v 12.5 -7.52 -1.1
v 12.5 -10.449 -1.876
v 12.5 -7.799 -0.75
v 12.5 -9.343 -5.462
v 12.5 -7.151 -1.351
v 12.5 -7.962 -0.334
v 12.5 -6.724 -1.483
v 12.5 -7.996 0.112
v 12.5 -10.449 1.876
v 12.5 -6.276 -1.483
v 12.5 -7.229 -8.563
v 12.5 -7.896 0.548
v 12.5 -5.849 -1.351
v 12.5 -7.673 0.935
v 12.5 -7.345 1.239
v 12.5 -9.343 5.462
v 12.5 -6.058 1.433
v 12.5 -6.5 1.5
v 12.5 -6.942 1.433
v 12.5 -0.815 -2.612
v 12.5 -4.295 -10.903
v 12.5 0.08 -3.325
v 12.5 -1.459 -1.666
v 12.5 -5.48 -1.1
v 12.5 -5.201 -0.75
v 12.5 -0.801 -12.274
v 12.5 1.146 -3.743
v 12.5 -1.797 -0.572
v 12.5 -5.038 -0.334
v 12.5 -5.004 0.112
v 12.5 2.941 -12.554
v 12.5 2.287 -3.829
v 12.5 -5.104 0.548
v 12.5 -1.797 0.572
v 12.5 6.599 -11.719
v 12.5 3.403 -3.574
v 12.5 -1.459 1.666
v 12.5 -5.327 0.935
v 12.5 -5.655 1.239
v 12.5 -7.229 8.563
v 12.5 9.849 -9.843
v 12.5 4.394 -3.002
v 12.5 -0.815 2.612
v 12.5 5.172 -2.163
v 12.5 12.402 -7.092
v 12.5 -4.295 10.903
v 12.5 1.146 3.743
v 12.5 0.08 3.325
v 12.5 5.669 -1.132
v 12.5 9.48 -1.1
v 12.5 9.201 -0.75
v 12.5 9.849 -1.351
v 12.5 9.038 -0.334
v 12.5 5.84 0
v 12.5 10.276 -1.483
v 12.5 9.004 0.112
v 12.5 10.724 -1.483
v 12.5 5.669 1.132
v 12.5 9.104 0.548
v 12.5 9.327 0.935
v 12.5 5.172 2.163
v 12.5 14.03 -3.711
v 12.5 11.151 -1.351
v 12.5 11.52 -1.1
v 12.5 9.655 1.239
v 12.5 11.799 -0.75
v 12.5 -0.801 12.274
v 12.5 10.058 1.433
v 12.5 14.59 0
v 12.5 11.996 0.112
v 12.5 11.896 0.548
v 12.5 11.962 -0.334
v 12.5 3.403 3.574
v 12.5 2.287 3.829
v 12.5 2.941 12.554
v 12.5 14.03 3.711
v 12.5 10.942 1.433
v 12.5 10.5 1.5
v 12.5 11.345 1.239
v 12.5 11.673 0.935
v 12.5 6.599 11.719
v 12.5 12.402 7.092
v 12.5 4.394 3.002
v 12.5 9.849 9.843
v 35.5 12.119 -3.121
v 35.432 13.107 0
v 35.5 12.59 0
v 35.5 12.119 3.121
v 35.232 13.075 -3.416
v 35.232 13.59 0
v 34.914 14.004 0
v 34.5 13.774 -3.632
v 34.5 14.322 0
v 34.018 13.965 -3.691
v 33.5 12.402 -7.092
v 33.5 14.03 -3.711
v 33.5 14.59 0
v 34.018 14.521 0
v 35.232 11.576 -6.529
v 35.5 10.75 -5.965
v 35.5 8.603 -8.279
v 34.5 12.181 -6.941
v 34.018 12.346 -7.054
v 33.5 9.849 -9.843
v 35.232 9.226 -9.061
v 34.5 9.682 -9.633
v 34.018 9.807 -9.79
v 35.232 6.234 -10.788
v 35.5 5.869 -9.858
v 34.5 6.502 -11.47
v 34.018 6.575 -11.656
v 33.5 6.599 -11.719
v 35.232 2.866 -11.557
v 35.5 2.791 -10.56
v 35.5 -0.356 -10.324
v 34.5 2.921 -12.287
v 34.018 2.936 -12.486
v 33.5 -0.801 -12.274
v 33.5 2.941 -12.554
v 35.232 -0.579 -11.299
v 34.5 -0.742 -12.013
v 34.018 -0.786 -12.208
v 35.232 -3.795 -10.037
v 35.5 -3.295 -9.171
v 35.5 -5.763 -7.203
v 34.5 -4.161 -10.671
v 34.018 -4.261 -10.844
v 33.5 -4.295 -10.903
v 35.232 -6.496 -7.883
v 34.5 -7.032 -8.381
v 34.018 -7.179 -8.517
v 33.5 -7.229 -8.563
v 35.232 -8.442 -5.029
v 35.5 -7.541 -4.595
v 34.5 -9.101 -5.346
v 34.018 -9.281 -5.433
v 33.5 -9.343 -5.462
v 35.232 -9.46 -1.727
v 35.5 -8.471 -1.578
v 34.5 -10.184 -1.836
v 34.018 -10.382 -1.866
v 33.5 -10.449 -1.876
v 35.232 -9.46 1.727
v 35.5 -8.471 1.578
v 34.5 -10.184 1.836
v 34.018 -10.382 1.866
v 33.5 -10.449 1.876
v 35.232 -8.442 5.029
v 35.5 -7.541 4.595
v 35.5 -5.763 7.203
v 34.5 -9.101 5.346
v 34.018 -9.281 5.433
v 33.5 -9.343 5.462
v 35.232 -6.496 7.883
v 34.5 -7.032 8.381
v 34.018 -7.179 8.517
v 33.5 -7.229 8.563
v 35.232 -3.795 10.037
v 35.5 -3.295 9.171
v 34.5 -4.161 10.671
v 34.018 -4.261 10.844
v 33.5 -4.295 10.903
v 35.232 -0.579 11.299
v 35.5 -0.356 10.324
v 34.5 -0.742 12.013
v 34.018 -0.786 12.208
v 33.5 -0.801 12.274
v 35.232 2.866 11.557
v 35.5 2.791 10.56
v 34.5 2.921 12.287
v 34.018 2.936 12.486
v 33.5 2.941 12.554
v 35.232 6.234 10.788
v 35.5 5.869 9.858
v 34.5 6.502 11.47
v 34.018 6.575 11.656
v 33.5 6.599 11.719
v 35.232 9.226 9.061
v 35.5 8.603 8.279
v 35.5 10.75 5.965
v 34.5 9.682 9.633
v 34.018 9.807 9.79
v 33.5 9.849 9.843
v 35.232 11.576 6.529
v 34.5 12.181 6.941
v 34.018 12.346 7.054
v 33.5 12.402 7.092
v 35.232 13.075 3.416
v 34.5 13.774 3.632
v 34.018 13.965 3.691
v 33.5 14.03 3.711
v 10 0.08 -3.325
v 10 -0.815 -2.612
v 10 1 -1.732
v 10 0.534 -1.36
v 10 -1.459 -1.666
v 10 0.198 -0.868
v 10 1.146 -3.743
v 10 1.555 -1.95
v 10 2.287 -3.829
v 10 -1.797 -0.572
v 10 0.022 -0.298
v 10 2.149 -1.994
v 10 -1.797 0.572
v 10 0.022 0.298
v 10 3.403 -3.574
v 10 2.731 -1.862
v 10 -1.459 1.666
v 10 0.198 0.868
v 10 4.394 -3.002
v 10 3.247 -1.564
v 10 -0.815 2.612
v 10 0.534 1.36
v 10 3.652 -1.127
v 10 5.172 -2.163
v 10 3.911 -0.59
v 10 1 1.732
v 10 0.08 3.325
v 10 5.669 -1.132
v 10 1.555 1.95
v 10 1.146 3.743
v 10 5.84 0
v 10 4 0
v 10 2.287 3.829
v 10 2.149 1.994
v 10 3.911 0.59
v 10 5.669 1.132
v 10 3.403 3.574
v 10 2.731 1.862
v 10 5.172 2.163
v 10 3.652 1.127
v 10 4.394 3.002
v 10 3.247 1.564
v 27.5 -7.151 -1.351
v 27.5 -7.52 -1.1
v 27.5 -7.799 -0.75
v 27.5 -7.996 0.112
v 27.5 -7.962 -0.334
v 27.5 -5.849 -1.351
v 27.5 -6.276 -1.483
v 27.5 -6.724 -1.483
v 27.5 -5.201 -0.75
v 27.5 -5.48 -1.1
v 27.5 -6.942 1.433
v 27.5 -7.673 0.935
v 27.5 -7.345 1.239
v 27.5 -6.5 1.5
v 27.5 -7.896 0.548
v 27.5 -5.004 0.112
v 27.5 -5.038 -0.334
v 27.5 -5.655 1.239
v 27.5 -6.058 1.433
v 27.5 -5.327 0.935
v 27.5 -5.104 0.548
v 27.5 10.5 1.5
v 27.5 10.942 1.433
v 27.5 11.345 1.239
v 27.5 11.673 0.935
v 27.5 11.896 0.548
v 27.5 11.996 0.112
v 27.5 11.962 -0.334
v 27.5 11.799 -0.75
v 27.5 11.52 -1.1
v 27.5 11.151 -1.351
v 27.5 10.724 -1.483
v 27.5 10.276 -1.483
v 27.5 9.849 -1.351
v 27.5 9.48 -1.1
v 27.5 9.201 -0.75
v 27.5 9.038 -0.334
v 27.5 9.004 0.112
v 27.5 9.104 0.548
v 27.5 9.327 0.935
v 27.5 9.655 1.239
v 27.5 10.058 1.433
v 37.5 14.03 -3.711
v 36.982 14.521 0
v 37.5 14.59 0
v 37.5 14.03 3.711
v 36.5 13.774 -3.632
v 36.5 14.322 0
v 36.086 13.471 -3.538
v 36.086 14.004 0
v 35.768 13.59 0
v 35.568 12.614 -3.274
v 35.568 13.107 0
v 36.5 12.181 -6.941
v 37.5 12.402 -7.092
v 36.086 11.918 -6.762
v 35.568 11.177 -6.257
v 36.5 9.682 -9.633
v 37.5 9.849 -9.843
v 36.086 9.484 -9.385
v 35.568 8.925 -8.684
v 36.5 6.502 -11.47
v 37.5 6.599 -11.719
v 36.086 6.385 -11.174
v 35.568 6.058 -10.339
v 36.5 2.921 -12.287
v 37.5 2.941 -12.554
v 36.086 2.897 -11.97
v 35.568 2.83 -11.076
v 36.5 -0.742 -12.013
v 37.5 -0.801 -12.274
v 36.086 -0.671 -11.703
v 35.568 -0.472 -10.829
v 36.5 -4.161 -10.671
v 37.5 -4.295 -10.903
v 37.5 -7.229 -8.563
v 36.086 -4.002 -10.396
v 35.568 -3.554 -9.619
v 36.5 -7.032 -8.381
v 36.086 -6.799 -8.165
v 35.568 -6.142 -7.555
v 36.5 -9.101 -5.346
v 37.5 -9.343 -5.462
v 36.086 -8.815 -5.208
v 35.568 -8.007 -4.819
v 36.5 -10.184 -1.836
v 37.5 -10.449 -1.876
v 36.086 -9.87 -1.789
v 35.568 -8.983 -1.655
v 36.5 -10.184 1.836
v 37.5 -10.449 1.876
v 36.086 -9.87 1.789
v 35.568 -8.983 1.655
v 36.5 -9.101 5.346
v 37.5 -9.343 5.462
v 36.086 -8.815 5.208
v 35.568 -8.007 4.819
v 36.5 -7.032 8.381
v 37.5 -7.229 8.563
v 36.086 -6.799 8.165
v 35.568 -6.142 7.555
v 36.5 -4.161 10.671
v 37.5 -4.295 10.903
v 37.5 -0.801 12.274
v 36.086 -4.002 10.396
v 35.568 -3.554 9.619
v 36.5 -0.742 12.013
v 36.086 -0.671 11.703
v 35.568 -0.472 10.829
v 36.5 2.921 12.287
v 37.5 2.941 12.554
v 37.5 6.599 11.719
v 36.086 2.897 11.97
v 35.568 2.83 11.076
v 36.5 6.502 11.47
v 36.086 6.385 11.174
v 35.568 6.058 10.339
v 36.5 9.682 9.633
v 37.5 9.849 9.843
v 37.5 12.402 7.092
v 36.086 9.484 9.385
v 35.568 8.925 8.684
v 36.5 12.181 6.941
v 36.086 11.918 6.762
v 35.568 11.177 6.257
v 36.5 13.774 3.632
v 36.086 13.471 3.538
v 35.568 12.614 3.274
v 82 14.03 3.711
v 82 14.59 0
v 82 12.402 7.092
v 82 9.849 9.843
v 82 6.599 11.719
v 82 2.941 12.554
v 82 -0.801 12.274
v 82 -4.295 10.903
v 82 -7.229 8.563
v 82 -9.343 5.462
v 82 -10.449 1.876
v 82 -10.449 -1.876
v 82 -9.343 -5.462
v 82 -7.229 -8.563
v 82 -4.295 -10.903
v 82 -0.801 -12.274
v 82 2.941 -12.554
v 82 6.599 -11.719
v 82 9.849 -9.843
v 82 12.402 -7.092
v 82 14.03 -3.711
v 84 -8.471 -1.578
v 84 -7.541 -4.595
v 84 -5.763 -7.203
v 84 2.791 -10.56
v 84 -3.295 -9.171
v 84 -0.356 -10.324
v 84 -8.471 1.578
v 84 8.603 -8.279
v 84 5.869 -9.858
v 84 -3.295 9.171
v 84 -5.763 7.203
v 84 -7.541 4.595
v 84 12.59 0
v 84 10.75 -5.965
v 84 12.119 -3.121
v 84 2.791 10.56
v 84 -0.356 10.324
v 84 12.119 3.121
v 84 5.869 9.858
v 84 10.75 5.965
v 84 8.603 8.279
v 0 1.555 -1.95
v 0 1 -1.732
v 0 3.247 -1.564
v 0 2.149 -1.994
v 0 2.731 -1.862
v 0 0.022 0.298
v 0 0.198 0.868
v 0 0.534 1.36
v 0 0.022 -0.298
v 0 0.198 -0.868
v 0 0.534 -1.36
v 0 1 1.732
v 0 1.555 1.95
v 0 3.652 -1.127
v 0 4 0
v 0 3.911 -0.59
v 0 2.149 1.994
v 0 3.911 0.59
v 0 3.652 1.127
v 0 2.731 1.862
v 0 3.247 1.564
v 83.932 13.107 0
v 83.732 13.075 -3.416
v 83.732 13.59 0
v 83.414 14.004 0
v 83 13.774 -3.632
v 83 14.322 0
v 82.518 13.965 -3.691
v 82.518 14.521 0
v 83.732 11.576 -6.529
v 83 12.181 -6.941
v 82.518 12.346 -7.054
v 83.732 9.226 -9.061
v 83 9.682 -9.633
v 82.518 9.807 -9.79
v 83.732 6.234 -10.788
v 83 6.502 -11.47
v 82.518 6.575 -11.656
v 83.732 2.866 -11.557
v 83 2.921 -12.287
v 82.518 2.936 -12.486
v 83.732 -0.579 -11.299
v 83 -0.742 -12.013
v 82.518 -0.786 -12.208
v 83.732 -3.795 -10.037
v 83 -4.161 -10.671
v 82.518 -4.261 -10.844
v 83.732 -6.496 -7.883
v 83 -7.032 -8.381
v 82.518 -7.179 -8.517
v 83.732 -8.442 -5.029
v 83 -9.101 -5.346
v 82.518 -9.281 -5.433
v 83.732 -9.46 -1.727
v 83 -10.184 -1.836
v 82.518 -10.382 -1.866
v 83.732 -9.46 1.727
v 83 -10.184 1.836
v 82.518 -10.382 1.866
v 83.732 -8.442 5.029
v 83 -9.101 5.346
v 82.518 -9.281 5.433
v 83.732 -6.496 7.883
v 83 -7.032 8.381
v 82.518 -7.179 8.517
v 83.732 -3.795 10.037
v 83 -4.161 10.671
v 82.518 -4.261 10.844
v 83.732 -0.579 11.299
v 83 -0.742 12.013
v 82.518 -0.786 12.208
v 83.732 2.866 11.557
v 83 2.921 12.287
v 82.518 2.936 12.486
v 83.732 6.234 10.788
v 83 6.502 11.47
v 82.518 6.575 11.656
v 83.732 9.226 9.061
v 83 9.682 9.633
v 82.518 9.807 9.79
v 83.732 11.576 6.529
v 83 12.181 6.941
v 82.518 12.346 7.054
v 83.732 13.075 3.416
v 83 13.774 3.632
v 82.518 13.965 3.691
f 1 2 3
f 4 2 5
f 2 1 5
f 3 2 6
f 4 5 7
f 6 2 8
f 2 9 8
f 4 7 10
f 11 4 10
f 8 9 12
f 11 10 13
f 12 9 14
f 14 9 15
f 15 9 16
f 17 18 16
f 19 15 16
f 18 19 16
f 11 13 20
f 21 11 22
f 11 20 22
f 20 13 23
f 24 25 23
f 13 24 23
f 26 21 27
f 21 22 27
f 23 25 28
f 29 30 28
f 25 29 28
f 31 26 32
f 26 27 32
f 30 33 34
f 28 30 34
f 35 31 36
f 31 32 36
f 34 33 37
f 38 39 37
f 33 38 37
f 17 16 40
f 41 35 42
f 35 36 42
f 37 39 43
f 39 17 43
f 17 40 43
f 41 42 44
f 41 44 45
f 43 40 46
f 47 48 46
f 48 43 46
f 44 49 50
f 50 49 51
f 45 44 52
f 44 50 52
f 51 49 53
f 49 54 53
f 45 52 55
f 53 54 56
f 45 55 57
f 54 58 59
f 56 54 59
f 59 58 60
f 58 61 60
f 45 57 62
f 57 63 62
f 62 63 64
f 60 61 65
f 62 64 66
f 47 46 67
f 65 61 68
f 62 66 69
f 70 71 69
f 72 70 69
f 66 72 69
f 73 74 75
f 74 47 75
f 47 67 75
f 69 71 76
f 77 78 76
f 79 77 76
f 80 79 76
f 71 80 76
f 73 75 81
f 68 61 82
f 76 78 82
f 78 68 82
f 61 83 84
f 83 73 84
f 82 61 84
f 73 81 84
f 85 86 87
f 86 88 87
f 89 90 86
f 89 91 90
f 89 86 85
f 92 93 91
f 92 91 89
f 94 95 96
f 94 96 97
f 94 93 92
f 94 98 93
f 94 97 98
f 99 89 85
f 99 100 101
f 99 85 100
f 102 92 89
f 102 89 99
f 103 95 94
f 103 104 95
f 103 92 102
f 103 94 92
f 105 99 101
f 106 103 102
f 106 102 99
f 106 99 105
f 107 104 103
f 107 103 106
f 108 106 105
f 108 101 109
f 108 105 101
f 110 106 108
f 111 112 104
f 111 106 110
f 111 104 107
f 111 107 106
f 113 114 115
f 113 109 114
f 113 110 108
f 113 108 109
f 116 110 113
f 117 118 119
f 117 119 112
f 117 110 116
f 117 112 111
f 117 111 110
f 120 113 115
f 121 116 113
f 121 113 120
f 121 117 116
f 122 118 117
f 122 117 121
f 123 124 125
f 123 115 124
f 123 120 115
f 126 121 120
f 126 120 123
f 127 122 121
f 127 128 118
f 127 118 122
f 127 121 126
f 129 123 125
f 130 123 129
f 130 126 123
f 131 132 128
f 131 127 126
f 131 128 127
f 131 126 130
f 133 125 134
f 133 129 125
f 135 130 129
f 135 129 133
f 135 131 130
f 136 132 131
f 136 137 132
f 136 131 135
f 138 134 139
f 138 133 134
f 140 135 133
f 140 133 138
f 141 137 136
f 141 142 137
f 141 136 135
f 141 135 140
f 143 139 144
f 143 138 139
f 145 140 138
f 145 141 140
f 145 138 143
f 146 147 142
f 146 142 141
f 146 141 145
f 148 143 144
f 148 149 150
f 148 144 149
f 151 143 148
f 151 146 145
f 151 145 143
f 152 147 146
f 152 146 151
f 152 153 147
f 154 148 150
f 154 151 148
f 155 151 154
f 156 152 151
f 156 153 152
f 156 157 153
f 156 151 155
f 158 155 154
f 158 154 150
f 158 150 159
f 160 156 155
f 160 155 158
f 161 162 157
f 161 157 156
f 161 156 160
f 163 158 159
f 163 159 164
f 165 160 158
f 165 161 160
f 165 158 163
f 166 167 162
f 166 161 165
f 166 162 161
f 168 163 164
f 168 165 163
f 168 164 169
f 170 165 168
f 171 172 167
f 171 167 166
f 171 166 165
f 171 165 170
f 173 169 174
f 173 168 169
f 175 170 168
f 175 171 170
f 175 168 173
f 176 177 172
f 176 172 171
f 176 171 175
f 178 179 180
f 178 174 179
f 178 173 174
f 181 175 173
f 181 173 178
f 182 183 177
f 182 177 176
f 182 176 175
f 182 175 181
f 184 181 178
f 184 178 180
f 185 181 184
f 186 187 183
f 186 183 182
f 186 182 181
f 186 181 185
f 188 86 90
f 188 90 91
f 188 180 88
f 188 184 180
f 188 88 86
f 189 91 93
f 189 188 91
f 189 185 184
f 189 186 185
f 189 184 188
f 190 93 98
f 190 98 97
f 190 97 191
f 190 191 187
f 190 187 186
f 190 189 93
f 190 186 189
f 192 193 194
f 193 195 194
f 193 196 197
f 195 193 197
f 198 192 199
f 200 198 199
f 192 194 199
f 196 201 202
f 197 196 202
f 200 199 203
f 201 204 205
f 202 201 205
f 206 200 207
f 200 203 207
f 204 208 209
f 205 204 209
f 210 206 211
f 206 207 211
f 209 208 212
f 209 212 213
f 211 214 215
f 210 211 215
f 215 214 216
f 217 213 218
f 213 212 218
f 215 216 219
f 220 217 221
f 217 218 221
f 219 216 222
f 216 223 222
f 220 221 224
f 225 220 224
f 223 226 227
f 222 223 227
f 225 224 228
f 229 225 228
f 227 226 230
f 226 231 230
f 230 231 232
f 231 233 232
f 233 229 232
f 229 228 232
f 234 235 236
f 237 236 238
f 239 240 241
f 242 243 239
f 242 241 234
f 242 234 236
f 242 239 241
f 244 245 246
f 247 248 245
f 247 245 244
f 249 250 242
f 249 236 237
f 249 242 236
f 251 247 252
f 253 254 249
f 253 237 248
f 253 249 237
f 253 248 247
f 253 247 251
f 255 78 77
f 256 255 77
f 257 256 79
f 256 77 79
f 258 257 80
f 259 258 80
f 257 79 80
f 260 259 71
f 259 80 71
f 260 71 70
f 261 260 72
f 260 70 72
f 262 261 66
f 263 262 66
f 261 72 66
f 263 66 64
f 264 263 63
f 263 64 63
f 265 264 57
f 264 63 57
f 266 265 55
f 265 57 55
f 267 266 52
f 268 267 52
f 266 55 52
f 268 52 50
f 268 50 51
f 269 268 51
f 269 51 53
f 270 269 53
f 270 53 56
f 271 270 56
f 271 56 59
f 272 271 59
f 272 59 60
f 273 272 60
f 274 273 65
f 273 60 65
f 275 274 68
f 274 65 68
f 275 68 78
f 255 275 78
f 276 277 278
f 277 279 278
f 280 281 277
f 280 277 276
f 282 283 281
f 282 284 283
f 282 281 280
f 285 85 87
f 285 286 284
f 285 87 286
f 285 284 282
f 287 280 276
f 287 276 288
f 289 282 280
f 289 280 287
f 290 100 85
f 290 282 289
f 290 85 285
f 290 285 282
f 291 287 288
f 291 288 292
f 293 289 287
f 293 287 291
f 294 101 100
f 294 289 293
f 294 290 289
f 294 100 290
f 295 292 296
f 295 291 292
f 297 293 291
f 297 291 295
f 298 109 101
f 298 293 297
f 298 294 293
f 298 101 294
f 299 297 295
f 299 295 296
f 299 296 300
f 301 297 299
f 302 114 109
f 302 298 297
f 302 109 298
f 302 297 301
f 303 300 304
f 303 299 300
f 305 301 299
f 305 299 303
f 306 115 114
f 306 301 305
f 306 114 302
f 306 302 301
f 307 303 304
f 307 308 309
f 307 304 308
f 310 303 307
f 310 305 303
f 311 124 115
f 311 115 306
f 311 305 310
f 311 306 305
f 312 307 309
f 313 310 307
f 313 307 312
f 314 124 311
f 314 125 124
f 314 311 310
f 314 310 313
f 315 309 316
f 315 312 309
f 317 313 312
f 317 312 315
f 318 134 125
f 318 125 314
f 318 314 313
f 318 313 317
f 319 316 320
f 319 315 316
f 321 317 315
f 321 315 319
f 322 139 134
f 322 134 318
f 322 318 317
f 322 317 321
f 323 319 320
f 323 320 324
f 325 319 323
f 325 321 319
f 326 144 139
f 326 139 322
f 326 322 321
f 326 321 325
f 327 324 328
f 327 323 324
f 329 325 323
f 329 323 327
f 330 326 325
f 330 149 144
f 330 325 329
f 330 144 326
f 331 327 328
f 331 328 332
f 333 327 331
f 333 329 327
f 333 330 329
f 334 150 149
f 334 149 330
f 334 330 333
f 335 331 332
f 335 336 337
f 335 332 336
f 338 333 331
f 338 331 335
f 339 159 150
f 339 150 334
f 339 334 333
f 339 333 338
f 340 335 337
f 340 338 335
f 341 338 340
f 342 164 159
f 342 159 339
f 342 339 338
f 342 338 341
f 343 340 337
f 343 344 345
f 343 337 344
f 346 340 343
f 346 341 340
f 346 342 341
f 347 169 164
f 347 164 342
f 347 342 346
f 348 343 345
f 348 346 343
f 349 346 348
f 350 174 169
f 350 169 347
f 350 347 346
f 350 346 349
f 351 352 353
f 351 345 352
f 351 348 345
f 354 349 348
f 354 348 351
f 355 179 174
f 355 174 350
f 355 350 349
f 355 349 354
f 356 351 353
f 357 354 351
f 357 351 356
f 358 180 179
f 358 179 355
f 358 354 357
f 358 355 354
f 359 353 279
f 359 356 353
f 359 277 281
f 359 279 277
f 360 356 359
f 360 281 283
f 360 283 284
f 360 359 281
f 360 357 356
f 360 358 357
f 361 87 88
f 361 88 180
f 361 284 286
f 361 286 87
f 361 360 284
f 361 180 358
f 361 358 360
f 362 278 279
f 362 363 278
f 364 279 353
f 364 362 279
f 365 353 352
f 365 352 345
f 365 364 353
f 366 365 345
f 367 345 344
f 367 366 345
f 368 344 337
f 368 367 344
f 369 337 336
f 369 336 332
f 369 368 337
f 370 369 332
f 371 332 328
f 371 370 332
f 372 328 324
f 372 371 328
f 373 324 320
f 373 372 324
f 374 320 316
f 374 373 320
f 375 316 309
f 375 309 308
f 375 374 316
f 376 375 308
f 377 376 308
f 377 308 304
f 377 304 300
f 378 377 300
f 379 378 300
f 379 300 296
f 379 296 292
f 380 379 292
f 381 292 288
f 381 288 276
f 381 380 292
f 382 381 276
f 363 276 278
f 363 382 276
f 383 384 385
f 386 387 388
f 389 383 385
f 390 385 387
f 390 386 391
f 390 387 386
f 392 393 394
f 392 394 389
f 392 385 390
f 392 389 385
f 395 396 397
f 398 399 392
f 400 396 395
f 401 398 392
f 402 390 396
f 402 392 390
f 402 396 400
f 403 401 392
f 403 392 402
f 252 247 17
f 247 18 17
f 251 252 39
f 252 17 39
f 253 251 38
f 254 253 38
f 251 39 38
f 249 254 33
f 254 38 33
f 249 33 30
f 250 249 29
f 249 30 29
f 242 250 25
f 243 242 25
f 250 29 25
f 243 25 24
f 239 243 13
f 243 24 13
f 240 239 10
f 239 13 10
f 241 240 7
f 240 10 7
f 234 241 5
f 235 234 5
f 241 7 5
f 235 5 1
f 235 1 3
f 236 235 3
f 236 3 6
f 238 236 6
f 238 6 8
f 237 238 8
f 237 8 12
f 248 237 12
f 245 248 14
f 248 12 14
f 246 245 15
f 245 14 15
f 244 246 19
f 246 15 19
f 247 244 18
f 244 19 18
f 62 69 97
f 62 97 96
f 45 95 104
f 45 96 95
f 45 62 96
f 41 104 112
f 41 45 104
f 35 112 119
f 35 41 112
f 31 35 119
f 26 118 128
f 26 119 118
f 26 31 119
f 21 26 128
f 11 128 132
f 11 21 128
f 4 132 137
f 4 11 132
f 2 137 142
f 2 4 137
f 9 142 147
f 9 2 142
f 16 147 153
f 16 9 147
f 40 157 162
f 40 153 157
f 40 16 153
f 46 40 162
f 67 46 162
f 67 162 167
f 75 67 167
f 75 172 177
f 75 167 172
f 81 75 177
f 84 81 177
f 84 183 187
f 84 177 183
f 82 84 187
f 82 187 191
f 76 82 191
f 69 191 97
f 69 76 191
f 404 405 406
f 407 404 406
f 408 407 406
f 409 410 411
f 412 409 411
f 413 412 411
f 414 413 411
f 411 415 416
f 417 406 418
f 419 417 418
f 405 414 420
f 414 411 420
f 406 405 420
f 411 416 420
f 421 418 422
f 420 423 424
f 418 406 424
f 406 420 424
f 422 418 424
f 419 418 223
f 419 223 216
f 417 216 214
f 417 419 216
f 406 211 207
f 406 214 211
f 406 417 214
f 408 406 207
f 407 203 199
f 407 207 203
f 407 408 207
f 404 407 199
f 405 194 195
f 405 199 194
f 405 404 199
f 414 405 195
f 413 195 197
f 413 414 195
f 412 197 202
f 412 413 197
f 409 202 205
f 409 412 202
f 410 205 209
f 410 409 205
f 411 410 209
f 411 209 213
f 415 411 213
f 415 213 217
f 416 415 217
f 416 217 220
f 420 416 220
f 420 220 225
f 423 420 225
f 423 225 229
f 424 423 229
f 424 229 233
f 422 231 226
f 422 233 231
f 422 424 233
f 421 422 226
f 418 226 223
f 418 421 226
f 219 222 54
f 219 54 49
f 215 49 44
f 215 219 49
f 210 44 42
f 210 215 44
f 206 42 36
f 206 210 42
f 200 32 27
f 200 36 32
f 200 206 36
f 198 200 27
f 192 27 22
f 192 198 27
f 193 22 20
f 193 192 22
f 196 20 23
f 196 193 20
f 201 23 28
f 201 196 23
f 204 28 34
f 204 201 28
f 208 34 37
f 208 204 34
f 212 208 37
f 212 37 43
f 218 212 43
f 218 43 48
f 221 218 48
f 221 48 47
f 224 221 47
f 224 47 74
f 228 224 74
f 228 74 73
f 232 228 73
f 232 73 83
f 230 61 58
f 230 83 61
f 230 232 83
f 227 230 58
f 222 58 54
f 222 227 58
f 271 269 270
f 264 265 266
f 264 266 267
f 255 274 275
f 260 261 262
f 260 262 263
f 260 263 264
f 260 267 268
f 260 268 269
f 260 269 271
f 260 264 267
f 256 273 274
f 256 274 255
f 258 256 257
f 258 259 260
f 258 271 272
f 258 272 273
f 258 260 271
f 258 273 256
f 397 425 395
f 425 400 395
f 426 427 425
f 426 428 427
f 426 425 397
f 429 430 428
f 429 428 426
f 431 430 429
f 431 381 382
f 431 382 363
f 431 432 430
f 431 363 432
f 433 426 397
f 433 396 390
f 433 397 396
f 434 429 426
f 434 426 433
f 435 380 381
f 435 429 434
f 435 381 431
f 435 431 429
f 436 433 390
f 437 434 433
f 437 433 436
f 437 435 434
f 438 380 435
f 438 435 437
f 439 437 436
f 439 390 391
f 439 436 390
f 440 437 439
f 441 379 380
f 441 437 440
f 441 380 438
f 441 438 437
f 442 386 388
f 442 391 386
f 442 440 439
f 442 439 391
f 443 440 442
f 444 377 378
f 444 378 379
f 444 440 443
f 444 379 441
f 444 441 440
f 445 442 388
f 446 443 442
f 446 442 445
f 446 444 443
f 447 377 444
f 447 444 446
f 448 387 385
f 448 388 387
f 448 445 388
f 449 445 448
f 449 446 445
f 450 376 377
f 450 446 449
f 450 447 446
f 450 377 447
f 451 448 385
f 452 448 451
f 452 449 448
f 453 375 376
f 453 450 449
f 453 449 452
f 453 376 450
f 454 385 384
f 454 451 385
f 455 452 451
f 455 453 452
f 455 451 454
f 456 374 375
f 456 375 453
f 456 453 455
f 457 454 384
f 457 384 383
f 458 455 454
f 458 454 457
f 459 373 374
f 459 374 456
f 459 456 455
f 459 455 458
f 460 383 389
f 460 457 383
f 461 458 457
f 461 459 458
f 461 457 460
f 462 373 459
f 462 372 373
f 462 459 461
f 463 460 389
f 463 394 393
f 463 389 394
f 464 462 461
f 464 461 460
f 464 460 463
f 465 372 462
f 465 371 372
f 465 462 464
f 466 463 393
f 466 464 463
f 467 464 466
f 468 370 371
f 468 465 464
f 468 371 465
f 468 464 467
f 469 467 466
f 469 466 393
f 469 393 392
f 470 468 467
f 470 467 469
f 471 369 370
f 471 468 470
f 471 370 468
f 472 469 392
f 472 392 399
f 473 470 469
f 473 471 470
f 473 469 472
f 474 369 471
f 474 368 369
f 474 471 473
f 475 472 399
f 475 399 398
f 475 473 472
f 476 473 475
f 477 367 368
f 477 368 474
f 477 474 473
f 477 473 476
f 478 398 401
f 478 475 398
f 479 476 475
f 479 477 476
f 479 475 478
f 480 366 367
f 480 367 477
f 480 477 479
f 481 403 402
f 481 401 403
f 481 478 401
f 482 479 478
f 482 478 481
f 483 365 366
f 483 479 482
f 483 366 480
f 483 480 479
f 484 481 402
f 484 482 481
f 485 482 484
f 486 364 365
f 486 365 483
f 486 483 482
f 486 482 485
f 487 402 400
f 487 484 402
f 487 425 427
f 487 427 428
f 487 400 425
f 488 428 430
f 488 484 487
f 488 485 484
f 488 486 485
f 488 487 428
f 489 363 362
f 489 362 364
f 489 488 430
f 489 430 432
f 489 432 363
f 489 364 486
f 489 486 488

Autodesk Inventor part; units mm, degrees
ref_plane "YZ Plane" through (0, 0, 0) normal (1, 0, 0) x (0, 1, 0)
ref_plane "XZ Plane" through (0, 0, 0) normal (0, 1, 0) x (-1, 0, 0)
ref_plane "XY Plane" through (0, 0, 0) normal (0, 0, 1) x (1, 0, 0)
sketch "Boceto1" plane through (0, 0, 0) normal (0, 0, 1) x (1, 0, 0)
  line L0 (0, 0) -> (10, 0)
  line L1 (10, 0) -> (10, -1.1604)
  line L2 (10, -1.1604) -> (12.5, -1.1604)
  line L3 (12.5, -1.1604) -> (12.5, -9.9104)
  line L4 (12.5, -9.9104) -> (33.5, -9.9104)
  line L5 (35.5, -7.9104) -> (35.5, 12.5896)
  line L6 (33.5, 14.5896) -> (12.5, 14.5896)
  line L7 (12.5, 14.5896) -> (12.5, 5.8396)
  line L8 (12.5, 5.8396) -> (10, 5.8396)
  line L9 (10, 5.8396) -> (10, 4)
  line L10 (10, 4) -> (0, 4)
  line L11 (0, 4) -> (0, 0)
  line L12 (37.5, 14.5896) -> (66.5, 14.5896)
  line L13 (66.5, 14.5896) -> (66.5, -9.9104)
  line L14 (66.5, -9.9104) -> (37.5, -9.9104)
  arc A0 (37.5, 14.5896) -> (35.5, 12.5896) centre (37.5, 12.5896) ccw
  arc A1 (35.5, -7.9104) -> (37.5, -9.9104) centre (37.5, -7.9104) ccw
  arc A2 (35.5, 12.5896) -> (33.5, 14.5896) centre (33.5, 12.5896) ccw
  arc A3 (33.5, -9.9104) -> (35.5, -7.9104) centre (33.5, -7.9104) ccw
  line L15 (66.5, 14.5896) -> (82, 14.5896)
  line L16 (84, 12.5896) -> (84, -7.9104)
  line L17 (82, -9.9104) -> (66.5, -9.9104)
  arc A4 (84, 12.5896) -> (82, 14.5896) centre (82, 12.5896) ccw
  arc A5 (82, -9.9104) -> (84, -7.9104) centre (82, -7.9104) ccw
  line L18 (-5.0848, 2) -> (93.2281, 2)
  point P0 (35.5, -9.9104)
  point P1 (35.5, 14.5896)
  point P2 (11.25, 5.8396)
  point P3 (11.25, -1.1604)
  point P4 (84, 14.5896)
  point P5 (0, 2)
  point P6 (84, 2)
  point P7 (35.5, 12.5896)
  dimension "d0" = 4
  dimension "d1" = 10
  dimension "d2" = 2.5
  dimension "d3" = 7
  dimension "d4" = 24.5
  dimension "d5" = 8.75
  dimension "d6" = 23
  dimension "d7" = 31
  dimension "d8" = 2
  dimension "d9" = 2
  dimension "d10" = 17.5
  dimension "d11" = 2
  dimension "d12" = 2
revolve "Revolución1" add sketch "Boceto1" angle 360 about axis through (-5.0848, 2, 0) along (1, 0, 0) contours L11 L10 L9 L8 L7 L6 A2 L5 L18 | L5 A0 L12 L13 L18 | L13 L15 A4 L16 L18
sketch "Boceto2" plane through (12.5, 2, 0) normal (-1, 0, 0) x (0, 0, 1)
  circle A0 centre (0, 8.5) radius 1.5
  circle A1 centre (0, -8.5) radius 1.5
  circle A2 centre (0, 0) radius 2 projected
  point P0 (0, -2)
  dimension "d14" = 3
  dimension "d15" = 3
  dimension "d17" = 8.5
  dimension "d18" = 17
extrude "Extrusión1" cut sketch "Boceto2" against normal blind 15 contours A0 | A1
thread "Rosca1" size "M3x0.5" class "6H" standard "ANSI Metric M Profile" length 40
thread "Rosca2" size "M3x0.5" class "6H" standard "ANSI Metric M Profile" length 40
properties part number "Motor"
